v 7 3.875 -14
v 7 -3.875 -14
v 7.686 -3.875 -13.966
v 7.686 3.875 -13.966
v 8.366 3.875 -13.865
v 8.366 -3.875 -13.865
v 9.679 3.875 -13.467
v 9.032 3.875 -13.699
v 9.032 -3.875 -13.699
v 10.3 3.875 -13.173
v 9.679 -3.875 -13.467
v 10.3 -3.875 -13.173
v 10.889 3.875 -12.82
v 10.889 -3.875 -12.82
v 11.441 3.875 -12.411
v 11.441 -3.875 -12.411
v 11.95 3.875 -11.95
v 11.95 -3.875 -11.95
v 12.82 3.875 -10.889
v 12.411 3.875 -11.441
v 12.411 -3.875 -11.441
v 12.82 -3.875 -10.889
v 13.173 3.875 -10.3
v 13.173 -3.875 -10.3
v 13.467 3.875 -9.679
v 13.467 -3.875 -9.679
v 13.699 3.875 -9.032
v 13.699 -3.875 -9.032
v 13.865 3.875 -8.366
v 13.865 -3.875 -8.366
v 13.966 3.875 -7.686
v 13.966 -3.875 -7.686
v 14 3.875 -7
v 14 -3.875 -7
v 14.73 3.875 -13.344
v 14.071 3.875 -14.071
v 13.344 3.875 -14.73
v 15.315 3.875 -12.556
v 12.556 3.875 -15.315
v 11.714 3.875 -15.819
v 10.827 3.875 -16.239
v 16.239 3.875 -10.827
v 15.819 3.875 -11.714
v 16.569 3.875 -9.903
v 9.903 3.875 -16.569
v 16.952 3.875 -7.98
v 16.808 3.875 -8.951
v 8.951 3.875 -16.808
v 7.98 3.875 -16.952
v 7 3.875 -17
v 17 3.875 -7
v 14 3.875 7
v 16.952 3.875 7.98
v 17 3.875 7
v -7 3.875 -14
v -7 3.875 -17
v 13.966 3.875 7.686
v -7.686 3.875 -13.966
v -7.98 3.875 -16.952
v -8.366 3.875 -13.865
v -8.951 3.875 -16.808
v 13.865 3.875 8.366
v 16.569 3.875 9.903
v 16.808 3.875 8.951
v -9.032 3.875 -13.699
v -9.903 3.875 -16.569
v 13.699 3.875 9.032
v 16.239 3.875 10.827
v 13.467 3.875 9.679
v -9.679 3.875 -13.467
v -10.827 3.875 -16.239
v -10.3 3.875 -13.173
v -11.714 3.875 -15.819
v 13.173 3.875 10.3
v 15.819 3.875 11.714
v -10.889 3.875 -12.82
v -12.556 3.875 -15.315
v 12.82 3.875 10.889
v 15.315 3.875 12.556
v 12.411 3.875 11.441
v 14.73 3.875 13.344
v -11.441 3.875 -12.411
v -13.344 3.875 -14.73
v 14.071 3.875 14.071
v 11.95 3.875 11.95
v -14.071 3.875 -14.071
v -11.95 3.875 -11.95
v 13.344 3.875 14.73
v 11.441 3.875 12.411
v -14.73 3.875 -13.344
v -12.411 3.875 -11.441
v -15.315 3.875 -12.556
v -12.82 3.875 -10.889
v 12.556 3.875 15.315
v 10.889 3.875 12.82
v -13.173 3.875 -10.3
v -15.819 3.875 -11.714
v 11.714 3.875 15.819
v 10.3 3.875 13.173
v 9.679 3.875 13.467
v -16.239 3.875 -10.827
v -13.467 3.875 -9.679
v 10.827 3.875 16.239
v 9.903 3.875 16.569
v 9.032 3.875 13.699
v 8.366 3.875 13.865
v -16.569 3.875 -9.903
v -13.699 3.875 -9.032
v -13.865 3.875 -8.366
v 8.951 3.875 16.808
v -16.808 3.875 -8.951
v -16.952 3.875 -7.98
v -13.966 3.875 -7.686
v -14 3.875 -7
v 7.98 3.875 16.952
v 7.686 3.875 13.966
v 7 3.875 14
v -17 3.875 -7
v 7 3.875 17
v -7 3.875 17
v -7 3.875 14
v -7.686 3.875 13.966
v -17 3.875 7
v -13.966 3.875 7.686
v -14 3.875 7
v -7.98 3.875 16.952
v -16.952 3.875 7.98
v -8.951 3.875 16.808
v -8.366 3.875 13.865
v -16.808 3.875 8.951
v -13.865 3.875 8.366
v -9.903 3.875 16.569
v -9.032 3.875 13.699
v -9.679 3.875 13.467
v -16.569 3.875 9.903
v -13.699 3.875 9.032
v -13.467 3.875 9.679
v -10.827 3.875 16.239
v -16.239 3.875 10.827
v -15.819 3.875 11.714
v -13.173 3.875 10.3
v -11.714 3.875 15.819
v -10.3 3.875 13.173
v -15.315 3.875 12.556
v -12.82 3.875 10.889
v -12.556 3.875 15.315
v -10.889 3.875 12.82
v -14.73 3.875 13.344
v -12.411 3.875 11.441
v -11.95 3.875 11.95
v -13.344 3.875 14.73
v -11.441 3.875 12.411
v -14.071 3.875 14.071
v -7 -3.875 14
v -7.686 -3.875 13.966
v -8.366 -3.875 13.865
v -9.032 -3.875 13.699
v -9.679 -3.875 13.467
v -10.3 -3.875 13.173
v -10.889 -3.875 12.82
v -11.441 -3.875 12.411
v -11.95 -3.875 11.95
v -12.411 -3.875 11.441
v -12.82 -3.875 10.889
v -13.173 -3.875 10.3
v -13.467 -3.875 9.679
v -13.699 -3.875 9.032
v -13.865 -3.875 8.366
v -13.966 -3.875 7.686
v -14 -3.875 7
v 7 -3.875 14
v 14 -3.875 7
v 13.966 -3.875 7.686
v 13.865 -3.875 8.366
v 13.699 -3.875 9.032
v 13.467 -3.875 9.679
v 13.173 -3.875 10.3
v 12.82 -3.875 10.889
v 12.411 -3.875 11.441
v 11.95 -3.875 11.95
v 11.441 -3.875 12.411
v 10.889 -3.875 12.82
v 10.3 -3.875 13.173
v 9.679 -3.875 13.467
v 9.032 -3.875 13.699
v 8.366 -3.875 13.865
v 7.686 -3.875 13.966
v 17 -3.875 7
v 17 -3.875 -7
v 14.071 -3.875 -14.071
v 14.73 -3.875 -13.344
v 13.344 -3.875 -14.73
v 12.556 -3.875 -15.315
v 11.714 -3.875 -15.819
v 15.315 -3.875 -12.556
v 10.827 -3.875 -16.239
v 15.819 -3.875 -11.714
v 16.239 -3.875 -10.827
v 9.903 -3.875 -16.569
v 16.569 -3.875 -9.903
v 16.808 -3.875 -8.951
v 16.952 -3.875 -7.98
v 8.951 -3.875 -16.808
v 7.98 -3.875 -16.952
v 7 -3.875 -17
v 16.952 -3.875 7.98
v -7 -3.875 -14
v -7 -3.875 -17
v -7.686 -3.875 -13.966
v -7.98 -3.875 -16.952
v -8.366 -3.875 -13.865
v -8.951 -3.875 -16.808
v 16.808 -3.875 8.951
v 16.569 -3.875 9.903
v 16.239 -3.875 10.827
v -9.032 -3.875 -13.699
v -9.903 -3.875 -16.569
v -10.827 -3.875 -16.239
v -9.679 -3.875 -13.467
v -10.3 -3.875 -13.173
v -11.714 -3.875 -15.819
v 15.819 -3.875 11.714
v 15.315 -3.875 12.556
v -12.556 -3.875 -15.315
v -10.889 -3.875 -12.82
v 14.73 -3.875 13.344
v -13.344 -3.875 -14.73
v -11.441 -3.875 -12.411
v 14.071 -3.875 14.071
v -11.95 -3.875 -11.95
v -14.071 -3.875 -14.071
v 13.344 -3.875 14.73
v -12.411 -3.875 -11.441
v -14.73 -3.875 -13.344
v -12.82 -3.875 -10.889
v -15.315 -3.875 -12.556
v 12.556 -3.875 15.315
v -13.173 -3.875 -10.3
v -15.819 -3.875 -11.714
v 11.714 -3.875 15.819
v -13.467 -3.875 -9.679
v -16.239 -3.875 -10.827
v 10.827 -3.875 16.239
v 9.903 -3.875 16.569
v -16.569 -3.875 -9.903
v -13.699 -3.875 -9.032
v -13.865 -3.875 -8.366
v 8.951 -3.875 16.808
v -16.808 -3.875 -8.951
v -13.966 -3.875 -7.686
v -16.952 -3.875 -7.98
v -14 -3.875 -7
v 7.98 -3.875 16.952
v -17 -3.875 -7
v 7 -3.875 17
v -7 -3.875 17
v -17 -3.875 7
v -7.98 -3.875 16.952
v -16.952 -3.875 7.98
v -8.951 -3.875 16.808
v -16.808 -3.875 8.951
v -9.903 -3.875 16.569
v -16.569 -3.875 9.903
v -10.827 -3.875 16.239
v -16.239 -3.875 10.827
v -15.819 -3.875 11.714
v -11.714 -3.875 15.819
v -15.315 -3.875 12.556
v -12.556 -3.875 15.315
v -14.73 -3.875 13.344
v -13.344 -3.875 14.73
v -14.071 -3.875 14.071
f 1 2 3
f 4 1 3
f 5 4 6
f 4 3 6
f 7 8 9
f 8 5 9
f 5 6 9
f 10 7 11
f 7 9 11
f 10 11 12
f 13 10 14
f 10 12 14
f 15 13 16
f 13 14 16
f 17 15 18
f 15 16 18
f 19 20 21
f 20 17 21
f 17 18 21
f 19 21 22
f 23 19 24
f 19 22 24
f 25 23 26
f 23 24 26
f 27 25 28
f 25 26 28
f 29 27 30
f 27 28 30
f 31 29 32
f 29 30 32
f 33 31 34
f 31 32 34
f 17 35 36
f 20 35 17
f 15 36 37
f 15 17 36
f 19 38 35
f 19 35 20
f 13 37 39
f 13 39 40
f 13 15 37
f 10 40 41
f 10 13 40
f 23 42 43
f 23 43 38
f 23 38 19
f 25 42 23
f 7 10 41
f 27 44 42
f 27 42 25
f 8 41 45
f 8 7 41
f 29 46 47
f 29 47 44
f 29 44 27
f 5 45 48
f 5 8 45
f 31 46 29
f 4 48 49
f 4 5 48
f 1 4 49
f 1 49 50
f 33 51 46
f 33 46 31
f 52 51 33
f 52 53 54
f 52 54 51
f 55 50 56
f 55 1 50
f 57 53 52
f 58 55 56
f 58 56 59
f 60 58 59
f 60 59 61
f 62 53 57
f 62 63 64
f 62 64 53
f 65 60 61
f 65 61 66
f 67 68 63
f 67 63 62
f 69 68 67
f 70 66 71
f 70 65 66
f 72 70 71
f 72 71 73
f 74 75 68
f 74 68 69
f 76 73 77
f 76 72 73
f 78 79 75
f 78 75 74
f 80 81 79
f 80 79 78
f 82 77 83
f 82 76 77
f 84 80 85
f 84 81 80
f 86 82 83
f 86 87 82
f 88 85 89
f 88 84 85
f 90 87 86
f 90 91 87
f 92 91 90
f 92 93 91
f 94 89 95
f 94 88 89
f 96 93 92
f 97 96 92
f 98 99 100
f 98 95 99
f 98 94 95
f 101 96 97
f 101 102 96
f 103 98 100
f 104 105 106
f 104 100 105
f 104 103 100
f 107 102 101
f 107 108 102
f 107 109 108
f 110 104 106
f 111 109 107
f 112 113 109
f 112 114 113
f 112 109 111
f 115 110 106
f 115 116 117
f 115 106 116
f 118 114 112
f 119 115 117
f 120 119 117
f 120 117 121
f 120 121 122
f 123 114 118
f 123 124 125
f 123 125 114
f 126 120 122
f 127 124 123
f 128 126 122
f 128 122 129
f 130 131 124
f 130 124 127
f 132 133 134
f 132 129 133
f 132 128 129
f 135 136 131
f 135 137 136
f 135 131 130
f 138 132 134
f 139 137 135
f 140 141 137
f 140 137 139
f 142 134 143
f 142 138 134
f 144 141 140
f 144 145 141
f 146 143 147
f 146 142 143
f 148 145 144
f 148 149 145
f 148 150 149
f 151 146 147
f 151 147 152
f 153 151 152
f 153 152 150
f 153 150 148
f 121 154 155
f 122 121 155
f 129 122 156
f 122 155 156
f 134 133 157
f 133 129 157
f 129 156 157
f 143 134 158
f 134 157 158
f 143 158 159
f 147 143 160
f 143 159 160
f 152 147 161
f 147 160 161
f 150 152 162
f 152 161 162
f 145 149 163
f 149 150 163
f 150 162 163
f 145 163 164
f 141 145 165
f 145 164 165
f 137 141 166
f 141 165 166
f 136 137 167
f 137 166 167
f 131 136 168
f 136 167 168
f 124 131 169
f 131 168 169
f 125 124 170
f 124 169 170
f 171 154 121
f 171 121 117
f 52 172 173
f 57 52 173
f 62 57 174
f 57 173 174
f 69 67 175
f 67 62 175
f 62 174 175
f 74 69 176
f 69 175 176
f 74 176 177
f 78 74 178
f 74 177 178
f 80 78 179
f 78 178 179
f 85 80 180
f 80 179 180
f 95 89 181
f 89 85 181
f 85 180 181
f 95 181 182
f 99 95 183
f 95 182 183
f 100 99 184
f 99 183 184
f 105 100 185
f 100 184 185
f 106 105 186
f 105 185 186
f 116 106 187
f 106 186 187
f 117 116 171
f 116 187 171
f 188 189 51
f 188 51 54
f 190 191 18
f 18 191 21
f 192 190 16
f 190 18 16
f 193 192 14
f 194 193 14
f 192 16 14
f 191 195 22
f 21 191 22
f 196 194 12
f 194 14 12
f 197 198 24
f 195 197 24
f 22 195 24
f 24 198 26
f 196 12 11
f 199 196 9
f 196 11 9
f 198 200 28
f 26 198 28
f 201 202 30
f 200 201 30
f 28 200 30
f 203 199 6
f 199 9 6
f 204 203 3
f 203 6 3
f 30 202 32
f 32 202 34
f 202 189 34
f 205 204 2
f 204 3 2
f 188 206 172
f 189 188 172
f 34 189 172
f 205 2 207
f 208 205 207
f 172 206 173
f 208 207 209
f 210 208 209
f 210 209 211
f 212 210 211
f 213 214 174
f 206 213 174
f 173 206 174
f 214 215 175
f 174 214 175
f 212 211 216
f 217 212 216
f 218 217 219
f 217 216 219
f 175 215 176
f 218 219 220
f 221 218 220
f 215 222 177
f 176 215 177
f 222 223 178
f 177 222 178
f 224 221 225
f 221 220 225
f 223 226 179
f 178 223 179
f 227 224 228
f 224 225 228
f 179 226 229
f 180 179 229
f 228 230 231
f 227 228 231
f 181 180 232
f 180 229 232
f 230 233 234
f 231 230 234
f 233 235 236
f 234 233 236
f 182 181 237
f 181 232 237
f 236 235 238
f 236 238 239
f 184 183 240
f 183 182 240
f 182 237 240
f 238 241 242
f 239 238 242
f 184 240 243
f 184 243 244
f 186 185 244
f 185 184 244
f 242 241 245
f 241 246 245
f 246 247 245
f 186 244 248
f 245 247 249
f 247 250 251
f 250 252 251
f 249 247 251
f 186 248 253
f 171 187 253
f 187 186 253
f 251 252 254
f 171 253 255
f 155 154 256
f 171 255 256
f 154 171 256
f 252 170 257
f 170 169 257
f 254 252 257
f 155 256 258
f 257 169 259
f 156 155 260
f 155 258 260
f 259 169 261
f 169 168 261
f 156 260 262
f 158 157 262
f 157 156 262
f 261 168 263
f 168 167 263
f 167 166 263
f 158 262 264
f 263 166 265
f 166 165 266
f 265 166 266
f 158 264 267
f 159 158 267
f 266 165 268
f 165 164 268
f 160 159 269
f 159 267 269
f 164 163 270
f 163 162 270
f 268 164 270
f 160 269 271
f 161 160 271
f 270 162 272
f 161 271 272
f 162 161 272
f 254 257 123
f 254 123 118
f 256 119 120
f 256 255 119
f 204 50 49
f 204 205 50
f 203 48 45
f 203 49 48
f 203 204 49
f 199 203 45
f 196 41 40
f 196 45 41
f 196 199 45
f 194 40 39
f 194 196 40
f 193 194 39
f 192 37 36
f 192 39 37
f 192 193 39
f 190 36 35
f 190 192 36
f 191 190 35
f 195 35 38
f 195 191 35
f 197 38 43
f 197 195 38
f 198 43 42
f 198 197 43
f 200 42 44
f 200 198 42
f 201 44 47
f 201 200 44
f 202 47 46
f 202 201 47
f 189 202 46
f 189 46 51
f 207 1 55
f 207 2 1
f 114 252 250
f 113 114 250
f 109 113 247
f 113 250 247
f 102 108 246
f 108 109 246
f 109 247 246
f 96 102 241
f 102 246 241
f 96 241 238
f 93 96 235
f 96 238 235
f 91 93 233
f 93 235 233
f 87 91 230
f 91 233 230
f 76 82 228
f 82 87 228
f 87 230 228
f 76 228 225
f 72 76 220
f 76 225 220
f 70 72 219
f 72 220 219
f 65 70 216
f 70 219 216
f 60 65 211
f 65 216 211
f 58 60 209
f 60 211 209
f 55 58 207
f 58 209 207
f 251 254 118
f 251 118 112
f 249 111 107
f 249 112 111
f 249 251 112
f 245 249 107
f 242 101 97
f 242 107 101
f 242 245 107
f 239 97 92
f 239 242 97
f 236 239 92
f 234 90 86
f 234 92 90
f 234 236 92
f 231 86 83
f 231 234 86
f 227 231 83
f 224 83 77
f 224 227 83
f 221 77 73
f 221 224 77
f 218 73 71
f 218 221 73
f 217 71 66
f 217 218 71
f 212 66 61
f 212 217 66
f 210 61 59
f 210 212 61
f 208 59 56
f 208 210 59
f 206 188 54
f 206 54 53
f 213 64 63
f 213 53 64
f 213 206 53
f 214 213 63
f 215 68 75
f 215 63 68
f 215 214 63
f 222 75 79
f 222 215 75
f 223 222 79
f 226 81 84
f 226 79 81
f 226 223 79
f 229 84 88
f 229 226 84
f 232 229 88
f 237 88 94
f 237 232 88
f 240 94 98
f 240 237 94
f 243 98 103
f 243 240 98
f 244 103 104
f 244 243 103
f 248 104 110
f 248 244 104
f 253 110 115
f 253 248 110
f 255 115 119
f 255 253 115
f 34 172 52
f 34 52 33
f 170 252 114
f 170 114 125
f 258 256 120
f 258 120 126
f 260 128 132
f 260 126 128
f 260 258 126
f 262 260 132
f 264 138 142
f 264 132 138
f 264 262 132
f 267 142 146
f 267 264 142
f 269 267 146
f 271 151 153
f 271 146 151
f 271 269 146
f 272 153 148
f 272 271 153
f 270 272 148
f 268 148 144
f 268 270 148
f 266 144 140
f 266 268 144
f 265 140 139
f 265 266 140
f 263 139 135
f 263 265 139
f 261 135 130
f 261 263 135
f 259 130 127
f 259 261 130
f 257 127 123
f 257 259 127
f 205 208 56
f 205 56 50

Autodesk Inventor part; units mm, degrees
ref_plane "YZ Plane" through (0, 0, 0) normal (1, 0, 0) x (0, 1, 0)
ref_plane "XZ Plane" through (0, 0, 0) normal (0, 1, 0) x (-1, 0, 0)
ref_plane "XY Plane" through (0, 0, 0) normal (0, 0, 1) x (1, 0, 0)
sketch "Sketch1" plane through (0, 0, 0) normal (0, 1, 0) x (-1, 0, 0)
  line L0 (-7, 17) -> (7, 17)
  line L1 (17, 7) -> (17, -7)
  line L2 (7, -17) -> (-7, -17)
  line L3 (-17, -7) -> (-17, 7)
  line L4 (-17, 17) -> (17, -17) construction
  line L5 (17, 17) -> (-17, -17) construction
  arc A0 (7, -17) -> (17, -7) centre (7, -7) ccw
  arc A1 (-17, -7) -> (-7, -17) centre (-7, -7) ccw
  arc A2 (-7, 17) -> (-17, 7) centre (-7, 7) ccw
  arc A3 (17, 7) -> (7, 17) centre (7, 7) ccw
  line L6 (14, -7) -> (14, 7)
  arc A4 (14, 7) -> (7, 14) centre (7, 7) ccw
  line L7 (7, 14) -> (-7, 14)
  arc A5 (-7, 14) -> (-14, 7) centre (-7, 7) ccw
  line L8 (-14, 7) -> (-14, -7)
  arc A6 (-14, -7) -> (-7, -14) centre (-7, -7) ccw
  line L9 (-7, -14) -> (7, -14)
  arc A7 (7, -14) -> (14, -7) centre (7, -7) ccw
  point P0 (0, 0)
  dimension "d0" = 34
  dimension "d1" = 10
  dimension "d2" = 3
extrude "Extrusion1" add sketch "Sketch1" along normal mid plane 7.75
properties part number "tenzo"
